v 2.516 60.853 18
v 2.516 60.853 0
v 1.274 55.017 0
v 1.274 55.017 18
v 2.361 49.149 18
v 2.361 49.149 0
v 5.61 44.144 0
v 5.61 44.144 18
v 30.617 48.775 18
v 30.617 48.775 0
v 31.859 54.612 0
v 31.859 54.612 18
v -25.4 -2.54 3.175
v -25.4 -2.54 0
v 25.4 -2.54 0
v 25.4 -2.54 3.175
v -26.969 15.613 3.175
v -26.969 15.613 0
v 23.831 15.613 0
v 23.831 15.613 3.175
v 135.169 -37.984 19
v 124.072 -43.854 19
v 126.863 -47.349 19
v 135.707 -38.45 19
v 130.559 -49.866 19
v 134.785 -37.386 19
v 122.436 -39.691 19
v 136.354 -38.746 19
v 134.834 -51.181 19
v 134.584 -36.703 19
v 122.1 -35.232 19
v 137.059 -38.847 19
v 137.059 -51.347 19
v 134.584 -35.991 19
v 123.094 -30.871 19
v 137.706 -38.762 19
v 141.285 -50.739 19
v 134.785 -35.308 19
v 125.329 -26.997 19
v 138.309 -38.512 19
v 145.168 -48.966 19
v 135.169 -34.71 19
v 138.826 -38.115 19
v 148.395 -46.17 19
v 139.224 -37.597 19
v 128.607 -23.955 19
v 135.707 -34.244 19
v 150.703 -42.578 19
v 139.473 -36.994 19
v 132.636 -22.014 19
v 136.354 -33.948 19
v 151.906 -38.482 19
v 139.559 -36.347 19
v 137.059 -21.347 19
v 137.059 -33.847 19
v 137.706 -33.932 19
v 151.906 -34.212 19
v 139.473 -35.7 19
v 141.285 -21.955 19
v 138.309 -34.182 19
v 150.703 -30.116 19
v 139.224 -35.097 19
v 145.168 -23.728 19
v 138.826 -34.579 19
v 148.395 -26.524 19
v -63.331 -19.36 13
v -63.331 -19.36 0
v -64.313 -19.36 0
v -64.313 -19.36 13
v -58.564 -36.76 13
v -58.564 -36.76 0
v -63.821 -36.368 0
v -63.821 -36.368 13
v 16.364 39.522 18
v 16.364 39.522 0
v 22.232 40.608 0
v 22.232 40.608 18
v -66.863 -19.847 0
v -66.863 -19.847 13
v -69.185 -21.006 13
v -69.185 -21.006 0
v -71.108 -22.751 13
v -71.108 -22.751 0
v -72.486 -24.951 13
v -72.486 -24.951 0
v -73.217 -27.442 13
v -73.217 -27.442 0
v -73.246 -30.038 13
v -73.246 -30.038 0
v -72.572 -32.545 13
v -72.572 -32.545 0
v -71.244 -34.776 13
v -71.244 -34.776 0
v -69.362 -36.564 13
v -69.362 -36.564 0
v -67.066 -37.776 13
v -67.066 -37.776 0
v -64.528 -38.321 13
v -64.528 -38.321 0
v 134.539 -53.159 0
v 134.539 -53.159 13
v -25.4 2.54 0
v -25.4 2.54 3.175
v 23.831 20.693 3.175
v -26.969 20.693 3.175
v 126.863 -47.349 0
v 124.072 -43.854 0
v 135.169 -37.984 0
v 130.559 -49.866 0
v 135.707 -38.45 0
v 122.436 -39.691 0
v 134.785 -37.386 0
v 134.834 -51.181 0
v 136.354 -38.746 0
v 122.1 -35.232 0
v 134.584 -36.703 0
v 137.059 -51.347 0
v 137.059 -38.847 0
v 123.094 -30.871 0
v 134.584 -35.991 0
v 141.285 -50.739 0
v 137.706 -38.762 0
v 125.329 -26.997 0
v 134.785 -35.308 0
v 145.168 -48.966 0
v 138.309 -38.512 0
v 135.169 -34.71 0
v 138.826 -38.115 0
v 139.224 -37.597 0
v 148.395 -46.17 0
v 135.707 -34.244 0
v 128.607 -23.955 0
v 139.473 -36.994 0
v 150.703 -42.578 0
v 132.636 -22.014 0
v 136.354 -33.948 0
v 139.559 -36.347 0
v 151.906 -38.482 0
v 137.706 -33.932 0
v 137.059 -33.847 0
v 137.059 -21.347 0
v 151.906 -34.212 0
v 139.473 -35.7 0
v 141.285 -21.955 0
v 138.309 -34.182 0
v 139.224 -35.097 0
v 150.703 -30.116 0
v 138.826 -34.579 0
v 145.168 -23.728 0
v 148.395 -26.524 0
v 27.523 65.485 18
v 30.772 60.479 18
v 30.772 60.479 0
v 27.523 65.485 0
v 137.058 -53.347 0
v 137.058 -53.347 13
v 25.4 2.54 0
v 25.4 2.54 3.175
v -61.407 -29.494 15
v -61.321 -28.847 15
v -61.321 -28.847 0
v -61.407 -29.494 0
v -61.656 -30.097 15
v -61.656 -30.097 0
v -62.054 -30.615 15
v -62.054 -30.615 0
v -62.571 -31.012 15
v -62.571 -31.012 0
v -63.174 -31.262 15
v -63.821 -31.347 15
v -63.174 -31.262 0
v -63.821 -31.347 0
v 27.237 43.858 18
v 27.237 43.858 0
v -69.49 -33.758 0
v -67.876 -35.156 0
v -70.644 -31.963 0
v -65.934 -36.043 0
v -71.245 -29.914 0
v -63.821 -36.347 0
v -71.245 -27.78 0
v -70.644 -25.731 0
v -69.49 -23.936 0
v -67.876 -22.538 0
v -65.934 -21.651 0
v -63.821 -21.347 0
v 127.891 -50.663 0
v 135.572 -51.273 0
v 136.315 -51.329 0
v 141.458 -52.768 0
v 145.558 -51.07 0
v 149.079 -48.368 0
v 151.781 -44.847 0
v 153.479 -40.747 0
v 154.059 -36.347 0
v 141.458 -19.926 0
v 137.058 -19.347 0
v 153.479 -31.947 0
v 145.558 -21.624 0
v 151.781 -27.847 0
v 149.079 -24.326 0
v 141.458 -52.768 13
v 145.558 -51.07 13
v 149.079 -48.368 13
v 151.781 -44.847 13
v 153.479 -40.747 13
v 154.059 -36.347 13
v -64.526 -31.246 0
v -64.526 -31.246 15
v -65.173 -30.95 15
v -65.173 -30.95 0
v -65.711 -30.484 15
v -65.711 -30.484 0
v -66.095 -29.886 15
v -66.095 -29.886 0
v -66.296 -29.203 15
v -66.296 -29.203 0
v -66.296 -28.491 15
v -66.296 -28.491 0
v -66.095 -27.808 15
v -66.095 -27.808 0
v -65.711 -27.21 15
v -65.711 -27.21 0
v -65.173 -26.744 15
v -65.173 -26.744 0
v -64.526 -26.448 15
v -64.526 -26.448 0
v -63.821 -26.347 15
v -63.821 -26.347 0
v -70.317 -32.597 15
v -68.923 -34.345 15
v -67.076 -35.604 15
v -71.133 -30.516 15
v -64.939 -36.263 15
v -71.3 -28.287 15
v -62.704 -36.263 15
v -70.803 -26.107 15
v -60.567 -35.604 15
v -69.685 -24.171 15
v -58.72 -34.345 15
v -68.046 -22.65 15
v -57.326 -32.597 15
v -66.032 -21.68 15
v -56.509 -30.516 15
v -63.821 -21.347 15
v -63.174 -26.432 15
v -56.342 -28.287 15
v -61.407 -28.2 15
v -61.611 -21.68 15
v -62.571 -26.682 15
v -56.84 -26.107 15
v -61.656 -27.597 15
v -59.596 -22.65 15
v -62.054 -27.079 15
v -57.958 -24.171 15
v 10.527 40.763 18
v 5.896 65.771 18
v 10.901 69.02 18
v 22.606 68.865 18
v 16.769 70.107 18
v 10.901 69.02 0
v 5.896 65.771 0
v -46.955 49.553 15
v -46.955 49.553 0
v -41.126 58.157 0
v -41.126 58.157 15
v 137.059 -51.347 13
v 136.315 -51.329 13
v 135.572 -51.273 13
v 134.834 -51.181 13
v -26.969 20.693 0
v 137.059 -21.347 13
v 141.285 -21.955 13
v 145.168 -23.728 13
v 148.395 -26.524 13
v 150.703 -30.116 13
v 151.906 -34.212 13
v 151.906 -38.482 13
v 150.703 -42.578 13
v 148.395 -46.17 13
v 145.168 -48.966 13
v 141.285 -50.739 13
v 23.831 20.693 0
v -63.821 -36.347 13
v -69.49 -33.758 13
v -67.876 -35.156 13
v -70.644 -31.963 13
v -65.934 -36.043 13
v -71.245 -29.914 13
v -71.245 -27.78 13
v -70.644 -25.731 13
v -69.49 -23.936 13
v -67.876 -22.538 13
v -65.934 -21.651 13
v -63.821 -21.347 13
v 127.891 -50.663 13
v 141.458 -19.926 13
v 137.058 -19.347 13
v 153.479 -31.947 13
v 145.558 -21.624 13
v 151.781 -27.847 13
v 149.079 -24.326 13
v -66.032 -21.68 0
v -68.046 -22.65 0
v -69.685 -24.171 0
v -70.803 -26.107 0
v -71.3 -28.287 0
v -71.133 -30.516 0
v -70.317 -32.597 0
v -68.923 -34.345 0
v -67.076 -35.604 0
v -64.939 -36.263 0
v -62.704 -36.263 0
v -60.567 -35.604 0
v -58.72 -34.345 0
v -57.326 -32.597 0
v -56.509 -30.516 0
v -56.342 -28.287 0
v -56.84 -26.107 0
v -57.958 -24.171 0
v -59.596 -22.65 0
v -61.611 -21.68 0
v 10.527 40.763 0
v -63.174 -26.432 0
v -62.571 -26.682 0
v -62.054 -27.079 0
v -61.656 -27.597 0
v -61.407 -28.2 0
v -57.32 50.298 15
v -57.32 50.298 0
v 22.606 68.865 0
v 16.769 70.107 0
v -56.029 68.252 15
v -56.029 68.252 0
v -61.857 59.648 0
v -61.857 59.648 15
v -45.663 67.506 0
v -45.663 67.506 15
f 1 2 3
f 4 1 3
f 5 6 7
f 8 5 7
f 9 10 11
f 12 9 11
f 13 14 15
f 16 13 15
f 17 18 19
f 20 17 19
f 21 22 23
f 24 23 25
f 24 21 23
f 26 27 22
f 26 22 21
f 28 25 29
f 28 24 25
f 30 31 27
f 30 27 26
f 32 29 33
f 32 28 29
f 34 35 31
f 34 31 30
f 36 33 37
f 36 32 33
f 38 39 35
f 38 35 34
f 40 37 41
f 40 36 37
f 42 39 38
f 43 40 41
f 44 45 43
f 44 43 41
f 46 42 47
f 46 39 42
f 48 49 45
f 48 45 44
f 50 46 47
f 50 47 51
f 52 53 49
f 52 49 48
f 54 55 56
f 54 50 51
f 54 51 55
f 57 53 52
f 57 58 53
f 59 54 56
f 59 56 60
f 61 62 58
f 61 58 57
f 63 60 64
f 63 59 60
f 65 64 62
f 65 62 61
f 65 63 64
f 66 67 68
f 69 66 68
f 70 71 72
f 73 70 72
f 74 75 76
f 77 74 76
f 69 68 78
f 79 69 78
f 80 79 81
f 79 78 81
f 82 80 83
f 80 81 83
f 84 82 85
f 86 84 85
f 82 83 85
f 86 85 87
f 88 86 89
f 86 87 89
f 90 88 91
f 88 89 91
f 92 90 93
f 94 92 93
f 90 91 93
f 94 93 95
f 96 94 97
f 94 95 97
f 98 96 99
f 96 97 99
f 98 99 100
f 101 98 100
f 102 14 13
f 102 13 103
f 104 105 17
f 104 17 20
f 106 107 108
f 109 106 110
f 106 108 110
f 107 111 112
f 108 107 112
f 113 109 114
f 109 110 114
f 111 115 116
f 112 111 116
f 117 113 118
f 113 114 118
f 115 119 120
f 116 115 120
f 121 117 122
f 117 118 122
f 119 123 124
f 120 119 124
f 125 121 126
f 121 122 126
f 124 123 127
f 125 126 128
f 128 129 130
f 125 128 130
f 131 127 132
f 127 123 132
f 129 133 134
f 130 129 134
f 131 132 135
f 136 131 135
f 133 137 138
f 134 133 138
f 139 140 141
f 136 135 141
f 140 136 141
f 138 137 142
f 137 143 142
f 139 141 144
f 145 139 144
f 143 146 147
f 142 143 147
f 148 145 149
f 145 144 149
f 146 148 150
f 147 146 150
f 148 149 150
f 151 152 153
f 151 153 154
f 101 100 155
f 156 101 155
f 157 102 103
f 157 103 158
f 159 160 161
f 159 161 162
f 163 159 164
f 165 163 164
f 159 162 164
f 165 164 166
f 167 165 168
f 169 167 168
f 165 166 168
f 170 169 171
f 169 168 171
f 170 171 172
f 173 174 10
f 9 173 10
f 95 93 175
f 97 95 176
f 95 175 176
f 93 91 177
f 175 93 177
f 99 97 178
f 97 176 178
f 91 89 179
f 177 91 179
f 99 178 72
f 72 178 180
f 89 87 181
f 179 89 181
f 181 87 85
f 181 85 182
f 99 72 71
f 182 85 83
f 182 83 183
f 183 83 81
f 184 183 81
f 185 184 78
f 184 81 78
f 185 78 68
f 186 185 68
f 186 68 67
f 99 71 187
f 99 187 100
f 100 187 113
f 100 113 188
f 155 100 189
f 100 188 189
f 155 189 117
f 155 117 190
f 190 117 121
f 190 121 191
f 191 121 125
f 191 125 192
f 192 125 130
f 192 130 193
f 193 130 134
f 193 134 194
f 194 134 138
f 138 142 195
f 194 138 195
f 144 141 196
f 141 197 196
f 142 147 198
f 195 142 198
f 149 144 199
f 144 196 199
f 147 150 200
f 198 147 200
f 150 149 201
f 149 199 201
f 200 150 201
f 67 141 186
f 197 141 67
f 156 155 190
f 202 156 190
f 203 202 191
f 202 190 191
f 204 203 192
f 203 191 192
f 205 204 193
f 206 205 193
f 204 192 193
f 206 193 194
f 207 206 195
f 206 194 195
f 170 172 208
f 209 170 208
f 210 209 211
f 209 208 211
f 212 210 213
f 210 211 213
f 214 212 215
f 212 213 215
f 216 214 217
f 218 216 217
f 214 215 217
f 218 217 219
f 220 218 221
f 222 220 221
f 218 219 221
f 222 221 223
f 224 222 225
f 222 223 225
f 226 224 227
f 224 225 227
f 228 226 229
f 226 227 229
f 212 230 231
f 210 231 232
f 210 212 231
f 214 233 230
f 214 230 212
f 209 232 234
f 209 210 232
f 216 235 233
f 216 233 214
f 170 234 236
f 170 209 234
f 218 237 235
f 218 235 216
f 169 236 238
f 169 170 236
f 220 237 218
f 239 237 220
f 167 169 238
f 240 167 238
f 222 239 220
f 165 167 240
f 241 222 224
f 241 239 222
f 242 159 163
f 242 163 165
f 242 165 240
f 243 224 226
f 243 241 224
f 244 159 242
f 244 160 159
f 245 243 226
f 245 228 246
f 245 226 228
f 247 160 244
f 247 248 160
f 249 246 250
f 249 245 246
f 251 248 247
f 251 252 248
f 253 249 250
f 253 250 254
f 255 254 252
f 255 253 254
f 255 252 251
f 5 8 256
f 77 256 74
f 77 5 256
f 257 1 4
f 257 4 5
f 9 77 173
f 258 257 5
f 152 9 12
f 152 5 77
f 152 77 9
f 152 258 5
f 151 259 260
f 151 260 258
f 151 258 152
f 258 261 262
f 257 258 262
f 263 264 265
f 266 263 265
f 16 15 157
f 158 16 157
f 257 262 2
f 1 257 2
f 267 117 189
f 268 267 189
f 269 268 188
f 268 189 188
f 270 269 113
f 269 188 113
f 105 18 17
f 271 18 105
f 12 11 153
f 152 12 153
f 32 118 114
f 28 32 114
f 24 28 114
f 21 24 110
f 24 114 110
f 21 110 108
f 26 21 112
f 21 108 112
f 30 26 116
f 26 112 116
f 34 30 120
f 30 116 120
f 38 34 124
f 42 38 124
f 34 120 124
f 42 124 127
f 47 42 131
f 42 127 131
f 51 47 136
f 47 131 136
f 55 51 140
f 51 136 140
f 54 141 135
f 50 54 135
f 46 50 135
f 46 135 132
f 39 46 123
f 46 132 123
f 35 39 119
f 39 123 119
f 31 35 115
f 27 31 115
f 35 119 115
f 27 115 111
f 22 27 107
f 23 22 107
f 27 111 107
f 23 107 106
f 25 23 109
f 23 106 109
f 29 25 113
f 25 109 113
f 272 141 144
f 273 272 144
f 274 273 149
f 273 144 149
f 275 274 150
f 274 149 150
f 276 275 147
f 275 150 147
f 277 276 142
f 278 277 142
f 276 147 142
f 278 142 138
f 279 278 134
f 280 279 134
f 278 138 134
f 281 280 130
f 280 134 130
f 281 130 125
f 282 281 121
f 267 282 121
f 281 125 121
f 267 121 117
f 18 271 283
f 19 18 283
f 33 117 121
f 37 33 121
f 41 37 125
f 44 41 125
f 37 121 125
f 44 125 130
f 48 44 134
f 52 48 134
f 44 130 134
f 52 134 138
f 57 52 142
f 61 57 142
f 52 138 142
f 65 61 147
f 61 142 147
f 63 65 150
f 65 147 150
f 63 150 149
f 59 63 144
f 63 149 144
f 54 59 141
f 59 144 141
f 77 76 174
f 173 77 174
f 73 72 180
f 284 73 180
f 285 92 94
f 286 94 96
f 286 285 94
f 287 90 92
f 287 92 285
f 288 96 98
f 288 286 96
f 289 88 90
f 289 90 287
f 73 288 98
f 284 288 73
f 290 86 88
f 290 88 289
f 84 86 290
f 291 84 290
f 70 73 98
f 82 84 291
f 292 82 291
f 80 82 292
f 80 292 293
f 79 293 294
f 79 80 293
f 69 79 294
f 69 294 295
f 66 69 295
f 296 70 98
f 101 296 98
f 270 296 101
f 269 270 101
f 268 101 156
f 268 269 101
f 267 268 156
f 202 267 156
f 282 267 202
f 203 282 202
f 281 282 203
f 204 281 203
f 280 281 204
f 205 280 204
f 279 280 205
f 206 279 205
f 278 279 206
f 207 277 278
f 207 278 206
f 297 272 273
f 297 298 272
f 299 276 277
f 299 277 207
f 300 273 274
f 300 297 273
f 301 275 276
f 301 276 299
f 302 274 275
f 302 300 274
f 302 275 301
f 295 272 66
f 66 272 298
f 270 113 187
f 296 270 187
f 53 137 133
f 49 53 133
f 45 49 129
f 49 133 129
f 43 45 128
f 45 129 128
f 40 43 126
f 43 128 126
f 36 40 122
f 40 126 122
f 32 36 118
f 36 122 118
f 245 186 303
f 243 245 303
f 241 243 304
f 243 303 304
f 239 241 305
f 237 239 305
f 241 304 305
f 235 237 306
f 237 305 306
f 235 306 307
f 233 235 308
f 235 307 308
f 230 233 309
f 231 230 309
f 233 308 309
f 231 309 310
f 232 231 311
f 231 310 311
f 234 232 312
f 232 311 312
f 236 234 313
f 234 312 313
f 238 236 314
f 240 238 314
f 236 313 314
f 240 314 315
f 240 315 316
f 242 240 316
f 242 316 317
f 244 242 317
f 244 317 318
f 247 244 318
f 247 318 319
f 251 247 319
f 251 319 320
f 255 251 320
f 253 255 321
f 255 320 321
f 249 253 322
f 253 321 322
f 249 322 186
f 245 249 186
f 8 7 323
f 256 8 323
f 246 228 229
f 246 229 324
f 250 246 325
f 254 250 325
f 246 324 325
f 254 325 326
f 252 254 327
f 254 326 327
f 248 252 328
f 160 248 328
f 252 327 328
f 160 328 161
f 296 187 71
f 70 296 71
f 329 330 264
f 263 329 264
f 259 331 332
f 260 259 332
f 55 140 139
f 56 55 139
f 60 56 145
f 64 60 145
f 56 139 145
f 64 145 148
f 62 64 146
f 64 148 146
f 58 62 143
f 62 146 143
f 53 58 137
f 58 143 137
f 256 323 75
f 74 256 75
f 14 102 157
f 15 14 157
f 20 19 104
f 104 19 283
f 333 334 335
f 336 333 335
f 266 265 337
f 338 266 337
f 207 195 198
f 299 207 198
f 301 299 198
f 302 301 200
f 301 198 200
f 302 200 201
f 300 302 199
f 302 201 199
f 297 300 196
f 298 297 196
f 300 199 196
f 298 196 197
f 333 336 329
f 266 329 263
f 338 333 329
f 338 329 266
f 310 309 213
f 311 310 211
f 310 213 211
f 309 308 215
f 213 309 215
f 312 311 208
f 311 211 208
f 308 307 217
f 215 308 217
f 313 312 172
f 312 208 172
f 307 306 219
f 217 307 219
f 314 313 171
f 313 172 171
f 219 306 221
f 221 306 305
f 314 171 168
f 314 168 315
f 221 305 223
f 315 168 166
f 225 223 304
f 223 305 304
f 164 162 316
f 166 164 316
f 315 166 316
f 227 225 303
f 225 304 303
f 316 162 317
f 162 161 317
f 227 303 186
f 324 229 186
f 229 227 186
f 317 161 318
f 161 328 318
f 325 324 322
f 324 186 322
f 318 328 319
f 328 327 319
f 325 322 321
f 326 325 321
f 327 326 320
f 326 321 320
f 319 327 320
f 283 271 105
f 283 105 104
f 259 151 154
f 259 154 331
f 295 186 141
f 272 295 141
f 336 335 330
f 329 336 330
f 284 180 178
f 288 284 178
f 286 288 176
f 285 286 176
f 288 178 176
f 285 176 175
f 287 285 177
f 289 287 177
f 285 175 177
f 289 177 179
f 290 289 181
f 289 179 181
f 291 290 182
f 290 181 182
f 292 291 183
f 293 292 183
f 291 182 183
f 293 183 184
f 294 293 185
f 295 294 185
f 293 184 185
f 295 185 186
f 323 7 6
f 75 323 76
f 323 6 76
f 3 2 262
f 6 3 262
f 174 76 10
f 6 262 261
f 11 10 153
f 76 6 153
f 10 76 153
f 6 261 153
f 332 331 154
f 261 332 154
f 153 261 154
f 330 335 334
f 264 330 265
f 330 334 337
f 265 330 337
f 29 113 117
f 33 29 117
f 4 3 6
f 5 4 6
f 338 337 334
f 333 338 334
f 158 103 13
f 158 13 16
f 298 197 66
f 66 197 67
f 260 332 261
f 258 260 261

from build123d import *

# Parameters (mm, degrees)
F0_W     = 50.8
F0_H     = 5.08
F1_DEPTH = 3.175
F3_DEPTH = 15
F4_DEPTH = 19
F5_DEPTH = 13
F7_DEPTH = 15
F8_DEPTH = 18


with BuildPart() as f1:
    # F0 (on Top) → F1 (new body)
    with BuildSketch(Plane.XY):
        Rectangle(F0_W, F0_H)
    extrude(amount=F1_DEPTH)


with BuildPart() as f1b:
    # F0 (on Top) → F1, piece 2 (new body)
    with BuildSketch(Plane.XY):
        with Locations((-1.5689044958, 18.152654171)):
            Rectangle(F0_W, F0_H)
    extrude(amount=F1_DEPTH)


with BuildPart() as f3:
    # F2 (on Top) → F3 (new body)
    with BuildSketch(Plane.XY):
        with BuildLine():
            ThreePointArc((-63.8213878035, -36.3469927565), (-58.5180869446, -34.1502936154), (-56.3213878035, -28.8469927565))
            ThreePointArc((-56.3213878035, -28.8469927565), (-58.5180869446, -23.5436918976), (-63.8213878035, -21.3469927565))
            Line((-63.8213878035, -21.3469927565), (-63.8213878035, -26.3469927565))
            ThreePointArc((-63.8213878035, -26.3469927565), (-62.0536208505, -27.0792258036), (-61.3213878035, -28.8469927565))
            ThreePointArc((-61.3213878035, -28.8469927565), (-62.0536208505, -30.6147597095), (-63.8213878035, -31.3469927565))
            Line((-63.8213878035, -31.3469927565), (-63.8213878035, -36.3469927565))
        make_face()
        with BuildLine():
            Line((-63.8213878035, -26.3469927565), (-63.8213878035, -21.3469927565))
            ThreePointArc((-63.8213878035, -21.3469927565), (-71.3213878035, -28.8469927565), (-63.8213878035, -36.3469927565))
            Line((-63.8213878035, -36.3469927565), (-63.8213878035, -31.3469927565))
            ThreePointArc((-63.8213878035, -31.3469927565), (-66.3213878035, -28.8469927565), (-63.8213878035, -26.3469927565))
        make_face()
    extrude(amount=F3_DEPTH)


with BuildPart() as f4:
    # F2 (on Top) → F4 (new body)
    with BuildSketch(Plane.XY):
        with BuildLine():
            ThreePointArc((152.0586520213, -36.3469927565), (147.6652537391, -25.7403910387), (137.0586520213, -21.3469927565))
            Line((137.0586520213, -21.3469927565), (137.0586520213, -33.8469927565))
            ThreePointArc((137.0586520213, -33.8469927565), (138.8264189743, -34.5792258036), (139.5586520213, -36.3469927565))
            ThreePointArc((139.5586520213, -36.3469927565), (138.8264189743, -38.1147597095), (137.0586520213, -38.8469927565))
            Line((137.0586520213, -38.8469927565), (137.0586520213, -51.3469927565))
            ThreePointArc((137.0586520213, -51.3469927565), (147.6652537391, -46.9535944743), (152.0586520213, -36.3469927565))
        make_face()
        with BuildLine():
            Line((137.0586520213, -33.8469927565), (137.0586520213, -21.3469927565))
            ThreePointArc((137.0586520213, -21.3469927565), (122.10018156, -35.2315728991), (134.8339886894, -51.1811045621))
            Line((134.8339886894, -51.1811045621), (137.0586520213, -51.3469927565))
            Line((137.0586520213, -51.3469927565), (137.0586520213, -38.8469927565))
            ThreePointArc((137.0586520213, -38.8469927565), (134.5586520213, -36.3469927565), (137.0586520213, -33.8469927565))
        make_face()
    extrude(amount=F4_DEPTH)


with BuildPart() as f5:
    # F2 (on Top) → F5 (new body)
    with BuildSketch(Plane.XY):
        with BuildLine():
            ThreePointArc((137.0575793333, -19.3469927904), (132.9350260676, -19.8547003448), (129.0586520213, -21.3469927565))
            Line((129.0586520213, -21.3469927565), (137.0586520213, -21.3469927565))
            ThreePointArc((137.0586520213, -21.3469927565), (147.6652537391, -25.7403910387), (152.0586520213, -36.3469927565))
            ThreePointArc((152.0586520213, -36.3469927565), (147.6652537391, -46.9535944743), (137.0586520213, -51.3469927565))
            ThreePointArc((137.0586520213, -51.3469927565), (135.9432321639, -51.3054632178), (134.8339886894, -51.1811045621))
            Line((134.8339886894, -51.1811045621), (127.8912978898, -50.6634035577))
            ThreePointArc((127.8912978898, -50.6634035577), (131.0835437493, -52.2623338191), (134.5393355413, -53.1592812526))
            Line((134.5393355413, -53.1592812526), (137.0575793333, -53.3469927227))
            ThreePointArc((137.0575793333, -53.3469927227), (149.079088043, -48.3681872832), (154.0586520213, -36.3469927565))
            ThreePointArc((154.0586520213, -36.3469927565), (149.079088043, -24.3257982299), (137.0575793333, -19.3469927904))
        make_face()
        with BuildLine():
            ThreePointArc((-63.3314036954, -19.3596371938), (-60.5083901395, -19.9433953668), (-57.9904359086, -21.3469927565))
            Line((-57.9904359086, -21.3469927565), (129.0586520213, -21.3469927565))
            ThreePointArc((129.0586520213, -21.3469927565), (132.9350260676, -19.8547003448), (137.0575793333, -19.3469927904))
            Line((137.0575793333, -19.3469927904), (-63.3314036954, -19.3596371938))
        make_face()
        with BuildLine():
            Line((127.8912978898, -50.6634035577), (-58.5642896201, -36.7598252893))
            ThreePointArc((-58.5642896201, -36.7598252893), (-61.4158085689, -38.0373784147), (-64.5275646067, -38.3207097843))
            Line((-64.5275646067, -38.3207097843), (134.5393355413, -53.1592812526))
            ThreePointArc((134.5393355413, -53.1592812526), (131.0835437493, -52.2623338191), (127.8912978898, -50.6634035577))
        make_face()
        with BuildLine():
            ThreePointArc((-63.8213878035, -36.3469927565), (-71.3213878035, -28.8469927565), (-63.8213878035, -21.3469927565))
            Line((-63.8213878035, -21.3469927565), (-57.9904359086, -21.3469927565))
            ThreePointArc((-57.9904359086, -21.3469927565), (-60.5083901395, -19.9433953668), (-63.3314036954, -19.3596371938))
            Line((-63.3314036954, -19.3596371938), (-64.3125691985, -19.3596991047))
            ThreePointArc((-64.3125691985, -19.3596991047), (-73.3207771608, -28.73928093), (-64.5275646067, -38.3207097843))
            ThreePointArc((-64.5275646067, -38.3207097843), (-61.4158085689, -38.0373784147), (-58.5642896201, -36.7598252893))
            Line((-58.5642896201, -36.7598252893), (-63.8213878035, -36.3678151756))
            Line((-63.8213878035, -36.3678151756), (-63.8213878035, -36.3469927565))
        make_face()
    extrude(amount=F5_DEPTH)


with BuildPart() as f7:
    # F6 (on Top) → F7 (new body)
    with BuildSketch(Plane.XY):
        Polygon((-46.9549453783, 49.5525677181), (-41.1264402413, 58.156550974), (-45.6634557461, 67.5061761167), (-56.028976388, 68.2518180035), (-61.857481525, 59.6478347477), (-57.3204660202, 50.298209605), align=None)
    extrude(amount=F7_DEPTH)


with BuildPart() as f8:
    # F6 (on Top) → F8 (new body)
    with BuildSketch(Plane.XY):
        Polygon((27.2367954121, 43.8576377804), (30.617481804, 48.7750025651), (31.8590347334, 54.6117879159), (30.7724390213, 60.4793961735), (27.523119015, 65.4845371709), (22.6057542303, 68.8652235629), (16.7689688795, 70.1067764922), (10.9013606219, 69.0201807801), (5.8962196245, 65.7708607738), (2.5155332325, 60.8534959891), (1.2739803032, 55.0167106384), (2.3605760153, 49.1491023807), (5.6098960216, 44.1439613833), (10.5272608063, 40.7632749914), (16.364046157, 39.521722062), (22.2316544147, 40.6083177741), align=None)
    extrude(amount=F8_DEPTH)


solid = Compound([f1.part, f1b.part, f3.part, f4.part, f5.part, f7.part, f8.part])
